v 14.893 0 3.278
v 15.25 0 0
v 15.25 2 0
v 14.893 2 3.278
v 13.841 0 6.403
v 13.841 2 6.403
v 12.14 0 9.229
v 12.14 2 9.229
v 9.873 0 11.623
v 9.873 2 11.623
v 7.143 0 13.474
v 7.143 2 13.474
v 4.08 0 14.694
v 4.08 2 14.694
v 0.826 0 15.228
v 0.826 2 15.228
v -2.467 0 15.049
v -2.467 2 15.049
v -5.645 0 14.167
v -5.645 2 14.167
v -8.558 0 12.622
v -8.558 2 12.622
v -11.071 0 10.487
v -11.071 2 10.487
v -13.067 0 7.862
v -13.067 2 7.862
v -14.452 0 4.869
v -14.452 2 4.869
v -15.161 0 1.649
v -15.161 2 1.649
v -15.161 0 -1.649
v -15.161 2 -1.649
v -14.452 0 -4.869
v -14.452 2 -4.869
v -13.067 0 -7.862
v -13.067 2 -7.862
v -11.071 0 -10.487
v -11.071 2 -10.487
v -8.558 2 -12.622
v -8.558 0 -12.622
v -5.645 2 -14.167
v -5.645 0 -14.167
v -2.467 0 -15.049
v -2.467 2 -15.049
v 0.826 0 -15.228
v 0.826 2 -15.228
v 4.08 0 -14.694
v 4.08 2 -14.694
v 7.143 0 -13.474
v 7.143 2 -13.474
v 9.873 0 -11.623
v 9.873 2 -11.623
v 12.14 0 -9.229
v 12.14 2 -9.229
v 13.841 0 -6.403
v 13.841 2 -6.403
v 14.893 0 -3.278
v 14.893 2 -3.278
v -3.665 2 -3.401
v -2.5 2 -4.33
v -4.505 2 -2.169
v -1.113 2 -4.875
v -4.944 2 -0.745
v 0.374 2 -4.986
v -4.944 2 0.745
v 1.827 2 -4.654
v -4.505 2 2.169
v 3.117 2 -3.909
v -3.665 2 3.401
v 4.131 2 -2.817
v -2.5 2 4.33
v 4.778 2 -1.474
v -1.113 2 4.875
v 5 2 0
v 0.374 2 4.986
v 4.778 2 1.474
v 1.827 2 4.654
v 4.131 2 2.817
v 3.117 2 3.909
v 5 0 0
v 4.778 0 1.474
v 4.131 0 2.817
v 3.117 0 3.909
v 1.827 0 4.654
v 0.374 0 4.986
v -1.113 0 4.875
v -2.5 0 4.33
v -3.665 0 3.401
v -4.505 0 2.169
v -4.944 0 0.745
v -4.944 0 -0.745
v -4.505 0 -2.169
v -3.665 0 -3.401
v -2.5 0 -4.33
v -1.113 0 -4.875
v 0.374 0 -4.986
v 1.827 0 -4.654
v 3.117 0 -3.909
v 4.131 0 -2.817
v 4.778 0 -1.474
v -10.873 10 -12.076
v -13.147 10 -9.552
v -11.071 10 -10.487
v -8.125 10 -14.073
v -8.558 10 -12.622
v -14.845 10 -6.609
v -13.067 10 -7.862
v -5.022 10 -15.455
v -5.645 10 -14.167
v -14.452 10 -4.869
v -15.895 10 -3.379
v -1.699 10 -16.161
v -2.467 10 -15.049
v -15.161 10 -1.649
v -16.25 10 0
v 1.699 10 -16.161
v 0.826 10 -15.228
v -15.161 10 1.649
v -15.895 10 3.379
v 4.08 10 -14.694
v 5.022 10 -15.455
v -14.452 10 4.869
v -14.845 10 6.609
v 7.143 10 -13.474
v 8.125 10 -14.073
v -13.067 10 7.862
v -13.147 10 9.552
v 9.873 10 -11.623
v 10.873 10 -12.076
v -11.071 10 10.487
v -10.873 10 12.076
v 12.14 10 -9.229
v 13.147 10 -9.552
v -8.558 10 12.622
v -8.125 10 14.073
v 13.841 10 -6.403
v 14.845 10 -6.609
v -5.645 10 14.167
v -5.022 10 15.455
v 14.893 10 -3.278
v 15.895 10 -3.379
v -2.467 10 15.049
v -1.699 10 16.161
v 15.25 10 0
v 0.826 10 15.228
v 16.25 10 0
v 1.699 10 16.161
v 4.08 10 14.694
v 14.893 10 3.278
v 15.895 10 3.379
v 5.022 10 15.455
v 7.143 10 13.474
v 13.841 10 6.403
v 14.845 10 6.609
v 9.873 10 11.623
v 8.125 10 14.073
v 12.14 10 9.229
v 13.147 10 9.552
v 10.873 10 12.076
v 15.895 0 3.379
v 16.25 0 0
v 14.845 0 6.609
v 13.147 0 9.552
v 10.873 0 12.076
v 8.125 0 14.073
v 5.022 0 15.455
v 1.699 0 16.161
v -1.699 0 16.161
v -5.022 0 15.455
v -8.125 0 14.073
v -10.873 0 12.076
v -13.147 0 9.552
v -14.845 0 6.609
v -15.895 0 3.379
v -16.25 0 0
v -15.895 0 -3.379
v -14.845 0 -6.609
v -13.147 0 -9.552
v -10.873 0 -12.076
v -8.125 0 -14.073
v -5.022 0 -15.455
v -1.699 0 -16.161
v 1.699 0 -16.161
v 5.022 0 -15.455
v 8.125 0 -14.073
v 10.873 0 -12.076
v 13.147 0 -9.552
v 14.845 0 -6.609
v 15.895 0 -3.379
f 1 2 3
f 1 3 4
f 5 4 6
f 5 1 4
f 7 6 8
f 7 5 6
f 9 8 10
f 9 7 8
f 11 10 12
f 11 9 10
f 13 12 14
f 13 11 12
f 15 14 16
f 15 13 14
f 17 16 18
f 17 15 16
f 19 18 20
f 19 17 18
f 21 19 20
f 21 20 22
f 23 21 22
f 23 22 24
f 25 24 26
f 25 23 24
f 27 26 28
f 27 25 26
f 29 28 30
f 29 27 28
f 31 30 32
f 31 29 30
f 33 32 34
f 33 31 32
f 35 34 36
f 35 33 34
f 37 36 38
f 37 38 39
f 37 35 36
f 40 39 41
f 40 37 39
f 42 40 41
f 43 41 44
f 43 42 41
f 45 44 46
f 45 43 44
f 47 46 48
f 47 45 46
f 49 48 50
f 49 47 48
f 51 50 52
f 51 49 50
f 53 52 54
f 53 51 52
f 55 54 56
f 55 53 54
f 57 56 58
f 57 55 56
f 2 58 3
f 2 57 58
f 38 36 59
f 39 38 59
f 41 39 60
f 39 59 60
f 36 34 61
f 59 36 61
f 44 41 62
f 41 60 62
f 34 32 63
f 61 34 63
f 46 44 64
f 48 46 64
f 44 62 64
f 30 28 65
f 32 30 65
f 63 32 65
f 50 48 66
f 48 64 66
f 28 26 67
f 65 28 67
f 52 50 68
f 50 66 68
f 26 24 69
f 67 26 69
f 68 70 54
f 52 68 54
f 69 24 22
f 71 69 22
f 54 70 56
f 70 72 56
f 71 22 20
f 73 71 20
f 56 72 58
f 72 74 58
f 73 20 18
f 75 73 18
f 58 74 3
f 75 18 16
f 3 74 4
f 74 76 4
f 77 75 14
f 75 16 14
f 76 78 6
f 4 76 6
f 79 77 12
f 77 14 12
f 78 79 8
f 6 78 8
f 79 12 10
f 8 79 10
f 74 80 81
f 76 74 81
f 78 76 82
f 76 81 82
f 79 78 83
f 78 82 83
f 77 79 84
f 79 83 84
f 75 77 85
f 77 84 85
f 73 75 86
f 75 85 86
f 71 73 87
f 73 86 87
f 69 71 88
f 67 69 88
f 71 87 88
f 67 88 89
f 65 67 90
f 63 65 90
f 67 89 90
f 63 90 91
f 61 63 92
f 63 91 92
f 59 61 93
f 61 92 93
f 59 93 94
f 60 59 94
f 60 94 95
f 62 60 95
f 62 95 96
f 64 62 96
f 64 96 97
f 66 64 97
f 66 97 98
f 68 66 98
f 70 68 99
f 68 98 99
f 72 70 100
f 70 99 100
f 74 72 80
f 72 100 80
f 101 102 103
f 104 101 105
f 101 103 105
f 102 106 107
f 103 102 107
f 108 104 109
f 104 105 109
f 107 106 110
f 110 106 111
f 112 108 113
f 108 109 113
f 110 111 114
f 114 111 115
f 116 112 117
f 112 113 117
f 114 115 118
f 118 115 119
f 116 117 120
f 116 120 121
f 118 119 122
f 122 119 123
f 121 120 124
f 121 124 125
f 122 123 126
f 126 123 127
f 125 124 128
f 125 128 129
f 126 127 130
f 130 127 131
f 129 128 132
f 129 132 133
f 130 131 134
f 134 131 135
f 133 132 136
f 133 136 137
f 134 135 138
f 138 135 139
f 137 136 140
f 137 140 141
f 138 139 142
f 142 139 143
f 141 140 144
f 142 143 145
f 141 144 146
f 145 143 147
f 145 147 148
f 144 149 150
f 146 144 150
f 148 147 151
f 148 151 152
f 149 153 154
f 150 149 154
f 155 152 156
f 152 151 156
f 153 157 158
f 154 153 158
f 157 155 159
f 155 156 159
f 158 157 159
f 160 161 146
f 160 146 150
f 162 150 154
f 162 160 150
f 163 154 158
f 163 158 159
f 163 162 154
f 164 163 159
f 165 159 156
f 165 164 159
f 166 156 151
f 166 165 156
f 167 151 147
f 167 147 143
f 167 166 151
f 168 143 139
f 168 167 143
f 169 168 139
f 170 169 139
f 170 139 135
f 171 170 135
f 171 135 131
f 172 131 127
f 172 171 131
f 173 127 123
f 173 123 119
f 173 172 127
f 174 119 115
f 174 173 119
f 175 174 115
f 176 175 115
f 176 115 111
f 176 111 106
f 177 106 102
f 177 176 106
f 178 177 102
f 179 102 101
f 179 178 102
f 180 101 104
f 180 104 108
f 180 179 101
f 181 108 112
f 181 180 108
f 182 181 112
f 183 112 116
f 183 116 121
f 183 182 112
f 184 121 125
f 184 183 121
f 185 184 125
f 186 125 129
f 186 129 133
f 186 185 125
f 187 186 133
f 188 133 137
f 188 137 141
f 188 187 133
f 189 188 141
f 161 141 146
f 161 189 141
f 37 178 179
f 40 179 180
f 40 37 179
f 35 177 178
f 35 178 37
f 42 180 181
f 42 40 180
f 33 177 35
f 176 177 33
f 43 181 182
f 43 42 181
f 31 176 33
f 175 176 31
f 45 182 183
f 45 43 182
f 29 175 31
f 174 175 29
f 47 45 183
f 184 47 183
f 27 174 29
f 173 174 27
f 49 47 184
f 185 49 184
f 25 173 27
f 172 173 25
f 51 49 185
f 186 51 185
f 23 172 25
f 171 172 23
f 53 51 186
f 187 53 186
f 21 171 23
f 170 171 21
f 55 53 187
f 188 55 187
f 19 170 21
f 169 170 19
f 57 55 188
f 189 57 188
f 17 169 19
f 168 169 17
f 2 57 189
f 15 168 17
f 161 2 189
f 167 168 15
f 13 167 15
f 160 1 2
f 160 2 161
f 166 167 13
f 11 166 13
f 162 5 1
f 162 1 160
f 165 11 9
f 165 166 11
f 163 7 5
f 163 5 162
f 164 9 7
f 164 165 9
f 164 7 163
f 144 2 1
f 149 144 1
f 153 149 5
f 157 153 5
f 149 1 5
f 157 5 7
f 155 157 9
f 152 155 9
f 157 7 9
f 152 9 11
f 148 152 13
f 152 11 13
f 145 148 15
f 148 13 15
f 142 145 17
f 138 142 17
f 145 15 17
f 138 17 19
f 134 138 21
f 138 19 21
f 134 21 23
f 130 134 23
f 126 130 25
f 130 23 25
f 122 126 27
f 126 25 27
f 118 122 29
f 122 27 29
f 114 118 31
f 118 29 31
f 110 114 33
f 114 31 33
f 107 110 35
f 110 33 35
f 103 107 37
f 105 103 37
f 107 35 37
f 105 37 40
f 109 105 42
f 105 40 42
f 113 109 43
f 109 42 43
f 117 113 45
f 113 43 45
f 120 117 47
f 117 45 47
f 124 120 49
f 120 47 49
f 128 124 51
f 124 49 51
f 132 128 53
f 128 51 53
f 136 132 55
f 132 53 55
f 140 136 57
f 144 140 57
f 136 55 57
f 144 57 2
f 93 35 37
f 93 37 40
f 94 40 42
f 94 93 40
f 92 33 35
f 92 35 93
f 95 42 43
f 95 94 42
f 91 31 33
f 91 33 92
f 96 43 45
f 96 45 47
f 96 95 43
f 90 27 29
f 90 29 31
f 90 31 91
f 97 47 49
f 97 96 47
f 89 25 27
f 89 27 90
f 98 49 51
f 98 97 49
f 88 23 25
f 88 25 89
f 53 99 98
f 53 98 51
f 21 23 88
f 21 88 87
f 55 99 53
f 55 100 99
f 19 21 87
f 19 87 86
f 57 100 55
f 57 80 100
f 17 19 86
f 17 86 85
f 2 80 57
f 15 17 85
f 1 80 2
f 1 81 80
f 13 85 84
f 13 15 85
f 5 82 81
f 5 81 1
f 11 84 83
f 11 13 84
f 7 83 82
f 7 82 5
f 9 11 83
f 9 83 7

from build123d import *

# Parameters (mm, degrees)
F0_R     = 16.25
F0_R_2   = 15.25
F1_DEPTH = 10
F2_R     = 15.25
F2_R_2   = 5
F3_DEPTH = 8
F4_DEPTH = 2


with BuildPart() as f1:
    # F0 (on Front) → F1 (new body)
    with BuildSketch(Plane.XZ):
        Circle(F0_R)
        Circle(F0_R_2, mode=Mode.SUBTRACT)
    extrude(amount=-F1_DEPTH)

    # F2 (on Front) → F3 (cut)
    with BuildSketch(Plane.XZ):
        Circle(F2_R)
        Circle(F2_R_2, mode=Mode.SUBTRACT)
    extrude(amount=F3_DEPTH, mode=Mode.SUBTRACT)


with BuildPart() as f4:
    # F2 (on Front) → F4 (new body)
    with BuildSketch(Plane.XZ):
        Circle(F2_R)
        Circle(F2_R_2, mode=Mode.SUBTRACT)
    extrude(amount=-F4_DEPTH)


solid = Compound([f1.part, f4.part])
